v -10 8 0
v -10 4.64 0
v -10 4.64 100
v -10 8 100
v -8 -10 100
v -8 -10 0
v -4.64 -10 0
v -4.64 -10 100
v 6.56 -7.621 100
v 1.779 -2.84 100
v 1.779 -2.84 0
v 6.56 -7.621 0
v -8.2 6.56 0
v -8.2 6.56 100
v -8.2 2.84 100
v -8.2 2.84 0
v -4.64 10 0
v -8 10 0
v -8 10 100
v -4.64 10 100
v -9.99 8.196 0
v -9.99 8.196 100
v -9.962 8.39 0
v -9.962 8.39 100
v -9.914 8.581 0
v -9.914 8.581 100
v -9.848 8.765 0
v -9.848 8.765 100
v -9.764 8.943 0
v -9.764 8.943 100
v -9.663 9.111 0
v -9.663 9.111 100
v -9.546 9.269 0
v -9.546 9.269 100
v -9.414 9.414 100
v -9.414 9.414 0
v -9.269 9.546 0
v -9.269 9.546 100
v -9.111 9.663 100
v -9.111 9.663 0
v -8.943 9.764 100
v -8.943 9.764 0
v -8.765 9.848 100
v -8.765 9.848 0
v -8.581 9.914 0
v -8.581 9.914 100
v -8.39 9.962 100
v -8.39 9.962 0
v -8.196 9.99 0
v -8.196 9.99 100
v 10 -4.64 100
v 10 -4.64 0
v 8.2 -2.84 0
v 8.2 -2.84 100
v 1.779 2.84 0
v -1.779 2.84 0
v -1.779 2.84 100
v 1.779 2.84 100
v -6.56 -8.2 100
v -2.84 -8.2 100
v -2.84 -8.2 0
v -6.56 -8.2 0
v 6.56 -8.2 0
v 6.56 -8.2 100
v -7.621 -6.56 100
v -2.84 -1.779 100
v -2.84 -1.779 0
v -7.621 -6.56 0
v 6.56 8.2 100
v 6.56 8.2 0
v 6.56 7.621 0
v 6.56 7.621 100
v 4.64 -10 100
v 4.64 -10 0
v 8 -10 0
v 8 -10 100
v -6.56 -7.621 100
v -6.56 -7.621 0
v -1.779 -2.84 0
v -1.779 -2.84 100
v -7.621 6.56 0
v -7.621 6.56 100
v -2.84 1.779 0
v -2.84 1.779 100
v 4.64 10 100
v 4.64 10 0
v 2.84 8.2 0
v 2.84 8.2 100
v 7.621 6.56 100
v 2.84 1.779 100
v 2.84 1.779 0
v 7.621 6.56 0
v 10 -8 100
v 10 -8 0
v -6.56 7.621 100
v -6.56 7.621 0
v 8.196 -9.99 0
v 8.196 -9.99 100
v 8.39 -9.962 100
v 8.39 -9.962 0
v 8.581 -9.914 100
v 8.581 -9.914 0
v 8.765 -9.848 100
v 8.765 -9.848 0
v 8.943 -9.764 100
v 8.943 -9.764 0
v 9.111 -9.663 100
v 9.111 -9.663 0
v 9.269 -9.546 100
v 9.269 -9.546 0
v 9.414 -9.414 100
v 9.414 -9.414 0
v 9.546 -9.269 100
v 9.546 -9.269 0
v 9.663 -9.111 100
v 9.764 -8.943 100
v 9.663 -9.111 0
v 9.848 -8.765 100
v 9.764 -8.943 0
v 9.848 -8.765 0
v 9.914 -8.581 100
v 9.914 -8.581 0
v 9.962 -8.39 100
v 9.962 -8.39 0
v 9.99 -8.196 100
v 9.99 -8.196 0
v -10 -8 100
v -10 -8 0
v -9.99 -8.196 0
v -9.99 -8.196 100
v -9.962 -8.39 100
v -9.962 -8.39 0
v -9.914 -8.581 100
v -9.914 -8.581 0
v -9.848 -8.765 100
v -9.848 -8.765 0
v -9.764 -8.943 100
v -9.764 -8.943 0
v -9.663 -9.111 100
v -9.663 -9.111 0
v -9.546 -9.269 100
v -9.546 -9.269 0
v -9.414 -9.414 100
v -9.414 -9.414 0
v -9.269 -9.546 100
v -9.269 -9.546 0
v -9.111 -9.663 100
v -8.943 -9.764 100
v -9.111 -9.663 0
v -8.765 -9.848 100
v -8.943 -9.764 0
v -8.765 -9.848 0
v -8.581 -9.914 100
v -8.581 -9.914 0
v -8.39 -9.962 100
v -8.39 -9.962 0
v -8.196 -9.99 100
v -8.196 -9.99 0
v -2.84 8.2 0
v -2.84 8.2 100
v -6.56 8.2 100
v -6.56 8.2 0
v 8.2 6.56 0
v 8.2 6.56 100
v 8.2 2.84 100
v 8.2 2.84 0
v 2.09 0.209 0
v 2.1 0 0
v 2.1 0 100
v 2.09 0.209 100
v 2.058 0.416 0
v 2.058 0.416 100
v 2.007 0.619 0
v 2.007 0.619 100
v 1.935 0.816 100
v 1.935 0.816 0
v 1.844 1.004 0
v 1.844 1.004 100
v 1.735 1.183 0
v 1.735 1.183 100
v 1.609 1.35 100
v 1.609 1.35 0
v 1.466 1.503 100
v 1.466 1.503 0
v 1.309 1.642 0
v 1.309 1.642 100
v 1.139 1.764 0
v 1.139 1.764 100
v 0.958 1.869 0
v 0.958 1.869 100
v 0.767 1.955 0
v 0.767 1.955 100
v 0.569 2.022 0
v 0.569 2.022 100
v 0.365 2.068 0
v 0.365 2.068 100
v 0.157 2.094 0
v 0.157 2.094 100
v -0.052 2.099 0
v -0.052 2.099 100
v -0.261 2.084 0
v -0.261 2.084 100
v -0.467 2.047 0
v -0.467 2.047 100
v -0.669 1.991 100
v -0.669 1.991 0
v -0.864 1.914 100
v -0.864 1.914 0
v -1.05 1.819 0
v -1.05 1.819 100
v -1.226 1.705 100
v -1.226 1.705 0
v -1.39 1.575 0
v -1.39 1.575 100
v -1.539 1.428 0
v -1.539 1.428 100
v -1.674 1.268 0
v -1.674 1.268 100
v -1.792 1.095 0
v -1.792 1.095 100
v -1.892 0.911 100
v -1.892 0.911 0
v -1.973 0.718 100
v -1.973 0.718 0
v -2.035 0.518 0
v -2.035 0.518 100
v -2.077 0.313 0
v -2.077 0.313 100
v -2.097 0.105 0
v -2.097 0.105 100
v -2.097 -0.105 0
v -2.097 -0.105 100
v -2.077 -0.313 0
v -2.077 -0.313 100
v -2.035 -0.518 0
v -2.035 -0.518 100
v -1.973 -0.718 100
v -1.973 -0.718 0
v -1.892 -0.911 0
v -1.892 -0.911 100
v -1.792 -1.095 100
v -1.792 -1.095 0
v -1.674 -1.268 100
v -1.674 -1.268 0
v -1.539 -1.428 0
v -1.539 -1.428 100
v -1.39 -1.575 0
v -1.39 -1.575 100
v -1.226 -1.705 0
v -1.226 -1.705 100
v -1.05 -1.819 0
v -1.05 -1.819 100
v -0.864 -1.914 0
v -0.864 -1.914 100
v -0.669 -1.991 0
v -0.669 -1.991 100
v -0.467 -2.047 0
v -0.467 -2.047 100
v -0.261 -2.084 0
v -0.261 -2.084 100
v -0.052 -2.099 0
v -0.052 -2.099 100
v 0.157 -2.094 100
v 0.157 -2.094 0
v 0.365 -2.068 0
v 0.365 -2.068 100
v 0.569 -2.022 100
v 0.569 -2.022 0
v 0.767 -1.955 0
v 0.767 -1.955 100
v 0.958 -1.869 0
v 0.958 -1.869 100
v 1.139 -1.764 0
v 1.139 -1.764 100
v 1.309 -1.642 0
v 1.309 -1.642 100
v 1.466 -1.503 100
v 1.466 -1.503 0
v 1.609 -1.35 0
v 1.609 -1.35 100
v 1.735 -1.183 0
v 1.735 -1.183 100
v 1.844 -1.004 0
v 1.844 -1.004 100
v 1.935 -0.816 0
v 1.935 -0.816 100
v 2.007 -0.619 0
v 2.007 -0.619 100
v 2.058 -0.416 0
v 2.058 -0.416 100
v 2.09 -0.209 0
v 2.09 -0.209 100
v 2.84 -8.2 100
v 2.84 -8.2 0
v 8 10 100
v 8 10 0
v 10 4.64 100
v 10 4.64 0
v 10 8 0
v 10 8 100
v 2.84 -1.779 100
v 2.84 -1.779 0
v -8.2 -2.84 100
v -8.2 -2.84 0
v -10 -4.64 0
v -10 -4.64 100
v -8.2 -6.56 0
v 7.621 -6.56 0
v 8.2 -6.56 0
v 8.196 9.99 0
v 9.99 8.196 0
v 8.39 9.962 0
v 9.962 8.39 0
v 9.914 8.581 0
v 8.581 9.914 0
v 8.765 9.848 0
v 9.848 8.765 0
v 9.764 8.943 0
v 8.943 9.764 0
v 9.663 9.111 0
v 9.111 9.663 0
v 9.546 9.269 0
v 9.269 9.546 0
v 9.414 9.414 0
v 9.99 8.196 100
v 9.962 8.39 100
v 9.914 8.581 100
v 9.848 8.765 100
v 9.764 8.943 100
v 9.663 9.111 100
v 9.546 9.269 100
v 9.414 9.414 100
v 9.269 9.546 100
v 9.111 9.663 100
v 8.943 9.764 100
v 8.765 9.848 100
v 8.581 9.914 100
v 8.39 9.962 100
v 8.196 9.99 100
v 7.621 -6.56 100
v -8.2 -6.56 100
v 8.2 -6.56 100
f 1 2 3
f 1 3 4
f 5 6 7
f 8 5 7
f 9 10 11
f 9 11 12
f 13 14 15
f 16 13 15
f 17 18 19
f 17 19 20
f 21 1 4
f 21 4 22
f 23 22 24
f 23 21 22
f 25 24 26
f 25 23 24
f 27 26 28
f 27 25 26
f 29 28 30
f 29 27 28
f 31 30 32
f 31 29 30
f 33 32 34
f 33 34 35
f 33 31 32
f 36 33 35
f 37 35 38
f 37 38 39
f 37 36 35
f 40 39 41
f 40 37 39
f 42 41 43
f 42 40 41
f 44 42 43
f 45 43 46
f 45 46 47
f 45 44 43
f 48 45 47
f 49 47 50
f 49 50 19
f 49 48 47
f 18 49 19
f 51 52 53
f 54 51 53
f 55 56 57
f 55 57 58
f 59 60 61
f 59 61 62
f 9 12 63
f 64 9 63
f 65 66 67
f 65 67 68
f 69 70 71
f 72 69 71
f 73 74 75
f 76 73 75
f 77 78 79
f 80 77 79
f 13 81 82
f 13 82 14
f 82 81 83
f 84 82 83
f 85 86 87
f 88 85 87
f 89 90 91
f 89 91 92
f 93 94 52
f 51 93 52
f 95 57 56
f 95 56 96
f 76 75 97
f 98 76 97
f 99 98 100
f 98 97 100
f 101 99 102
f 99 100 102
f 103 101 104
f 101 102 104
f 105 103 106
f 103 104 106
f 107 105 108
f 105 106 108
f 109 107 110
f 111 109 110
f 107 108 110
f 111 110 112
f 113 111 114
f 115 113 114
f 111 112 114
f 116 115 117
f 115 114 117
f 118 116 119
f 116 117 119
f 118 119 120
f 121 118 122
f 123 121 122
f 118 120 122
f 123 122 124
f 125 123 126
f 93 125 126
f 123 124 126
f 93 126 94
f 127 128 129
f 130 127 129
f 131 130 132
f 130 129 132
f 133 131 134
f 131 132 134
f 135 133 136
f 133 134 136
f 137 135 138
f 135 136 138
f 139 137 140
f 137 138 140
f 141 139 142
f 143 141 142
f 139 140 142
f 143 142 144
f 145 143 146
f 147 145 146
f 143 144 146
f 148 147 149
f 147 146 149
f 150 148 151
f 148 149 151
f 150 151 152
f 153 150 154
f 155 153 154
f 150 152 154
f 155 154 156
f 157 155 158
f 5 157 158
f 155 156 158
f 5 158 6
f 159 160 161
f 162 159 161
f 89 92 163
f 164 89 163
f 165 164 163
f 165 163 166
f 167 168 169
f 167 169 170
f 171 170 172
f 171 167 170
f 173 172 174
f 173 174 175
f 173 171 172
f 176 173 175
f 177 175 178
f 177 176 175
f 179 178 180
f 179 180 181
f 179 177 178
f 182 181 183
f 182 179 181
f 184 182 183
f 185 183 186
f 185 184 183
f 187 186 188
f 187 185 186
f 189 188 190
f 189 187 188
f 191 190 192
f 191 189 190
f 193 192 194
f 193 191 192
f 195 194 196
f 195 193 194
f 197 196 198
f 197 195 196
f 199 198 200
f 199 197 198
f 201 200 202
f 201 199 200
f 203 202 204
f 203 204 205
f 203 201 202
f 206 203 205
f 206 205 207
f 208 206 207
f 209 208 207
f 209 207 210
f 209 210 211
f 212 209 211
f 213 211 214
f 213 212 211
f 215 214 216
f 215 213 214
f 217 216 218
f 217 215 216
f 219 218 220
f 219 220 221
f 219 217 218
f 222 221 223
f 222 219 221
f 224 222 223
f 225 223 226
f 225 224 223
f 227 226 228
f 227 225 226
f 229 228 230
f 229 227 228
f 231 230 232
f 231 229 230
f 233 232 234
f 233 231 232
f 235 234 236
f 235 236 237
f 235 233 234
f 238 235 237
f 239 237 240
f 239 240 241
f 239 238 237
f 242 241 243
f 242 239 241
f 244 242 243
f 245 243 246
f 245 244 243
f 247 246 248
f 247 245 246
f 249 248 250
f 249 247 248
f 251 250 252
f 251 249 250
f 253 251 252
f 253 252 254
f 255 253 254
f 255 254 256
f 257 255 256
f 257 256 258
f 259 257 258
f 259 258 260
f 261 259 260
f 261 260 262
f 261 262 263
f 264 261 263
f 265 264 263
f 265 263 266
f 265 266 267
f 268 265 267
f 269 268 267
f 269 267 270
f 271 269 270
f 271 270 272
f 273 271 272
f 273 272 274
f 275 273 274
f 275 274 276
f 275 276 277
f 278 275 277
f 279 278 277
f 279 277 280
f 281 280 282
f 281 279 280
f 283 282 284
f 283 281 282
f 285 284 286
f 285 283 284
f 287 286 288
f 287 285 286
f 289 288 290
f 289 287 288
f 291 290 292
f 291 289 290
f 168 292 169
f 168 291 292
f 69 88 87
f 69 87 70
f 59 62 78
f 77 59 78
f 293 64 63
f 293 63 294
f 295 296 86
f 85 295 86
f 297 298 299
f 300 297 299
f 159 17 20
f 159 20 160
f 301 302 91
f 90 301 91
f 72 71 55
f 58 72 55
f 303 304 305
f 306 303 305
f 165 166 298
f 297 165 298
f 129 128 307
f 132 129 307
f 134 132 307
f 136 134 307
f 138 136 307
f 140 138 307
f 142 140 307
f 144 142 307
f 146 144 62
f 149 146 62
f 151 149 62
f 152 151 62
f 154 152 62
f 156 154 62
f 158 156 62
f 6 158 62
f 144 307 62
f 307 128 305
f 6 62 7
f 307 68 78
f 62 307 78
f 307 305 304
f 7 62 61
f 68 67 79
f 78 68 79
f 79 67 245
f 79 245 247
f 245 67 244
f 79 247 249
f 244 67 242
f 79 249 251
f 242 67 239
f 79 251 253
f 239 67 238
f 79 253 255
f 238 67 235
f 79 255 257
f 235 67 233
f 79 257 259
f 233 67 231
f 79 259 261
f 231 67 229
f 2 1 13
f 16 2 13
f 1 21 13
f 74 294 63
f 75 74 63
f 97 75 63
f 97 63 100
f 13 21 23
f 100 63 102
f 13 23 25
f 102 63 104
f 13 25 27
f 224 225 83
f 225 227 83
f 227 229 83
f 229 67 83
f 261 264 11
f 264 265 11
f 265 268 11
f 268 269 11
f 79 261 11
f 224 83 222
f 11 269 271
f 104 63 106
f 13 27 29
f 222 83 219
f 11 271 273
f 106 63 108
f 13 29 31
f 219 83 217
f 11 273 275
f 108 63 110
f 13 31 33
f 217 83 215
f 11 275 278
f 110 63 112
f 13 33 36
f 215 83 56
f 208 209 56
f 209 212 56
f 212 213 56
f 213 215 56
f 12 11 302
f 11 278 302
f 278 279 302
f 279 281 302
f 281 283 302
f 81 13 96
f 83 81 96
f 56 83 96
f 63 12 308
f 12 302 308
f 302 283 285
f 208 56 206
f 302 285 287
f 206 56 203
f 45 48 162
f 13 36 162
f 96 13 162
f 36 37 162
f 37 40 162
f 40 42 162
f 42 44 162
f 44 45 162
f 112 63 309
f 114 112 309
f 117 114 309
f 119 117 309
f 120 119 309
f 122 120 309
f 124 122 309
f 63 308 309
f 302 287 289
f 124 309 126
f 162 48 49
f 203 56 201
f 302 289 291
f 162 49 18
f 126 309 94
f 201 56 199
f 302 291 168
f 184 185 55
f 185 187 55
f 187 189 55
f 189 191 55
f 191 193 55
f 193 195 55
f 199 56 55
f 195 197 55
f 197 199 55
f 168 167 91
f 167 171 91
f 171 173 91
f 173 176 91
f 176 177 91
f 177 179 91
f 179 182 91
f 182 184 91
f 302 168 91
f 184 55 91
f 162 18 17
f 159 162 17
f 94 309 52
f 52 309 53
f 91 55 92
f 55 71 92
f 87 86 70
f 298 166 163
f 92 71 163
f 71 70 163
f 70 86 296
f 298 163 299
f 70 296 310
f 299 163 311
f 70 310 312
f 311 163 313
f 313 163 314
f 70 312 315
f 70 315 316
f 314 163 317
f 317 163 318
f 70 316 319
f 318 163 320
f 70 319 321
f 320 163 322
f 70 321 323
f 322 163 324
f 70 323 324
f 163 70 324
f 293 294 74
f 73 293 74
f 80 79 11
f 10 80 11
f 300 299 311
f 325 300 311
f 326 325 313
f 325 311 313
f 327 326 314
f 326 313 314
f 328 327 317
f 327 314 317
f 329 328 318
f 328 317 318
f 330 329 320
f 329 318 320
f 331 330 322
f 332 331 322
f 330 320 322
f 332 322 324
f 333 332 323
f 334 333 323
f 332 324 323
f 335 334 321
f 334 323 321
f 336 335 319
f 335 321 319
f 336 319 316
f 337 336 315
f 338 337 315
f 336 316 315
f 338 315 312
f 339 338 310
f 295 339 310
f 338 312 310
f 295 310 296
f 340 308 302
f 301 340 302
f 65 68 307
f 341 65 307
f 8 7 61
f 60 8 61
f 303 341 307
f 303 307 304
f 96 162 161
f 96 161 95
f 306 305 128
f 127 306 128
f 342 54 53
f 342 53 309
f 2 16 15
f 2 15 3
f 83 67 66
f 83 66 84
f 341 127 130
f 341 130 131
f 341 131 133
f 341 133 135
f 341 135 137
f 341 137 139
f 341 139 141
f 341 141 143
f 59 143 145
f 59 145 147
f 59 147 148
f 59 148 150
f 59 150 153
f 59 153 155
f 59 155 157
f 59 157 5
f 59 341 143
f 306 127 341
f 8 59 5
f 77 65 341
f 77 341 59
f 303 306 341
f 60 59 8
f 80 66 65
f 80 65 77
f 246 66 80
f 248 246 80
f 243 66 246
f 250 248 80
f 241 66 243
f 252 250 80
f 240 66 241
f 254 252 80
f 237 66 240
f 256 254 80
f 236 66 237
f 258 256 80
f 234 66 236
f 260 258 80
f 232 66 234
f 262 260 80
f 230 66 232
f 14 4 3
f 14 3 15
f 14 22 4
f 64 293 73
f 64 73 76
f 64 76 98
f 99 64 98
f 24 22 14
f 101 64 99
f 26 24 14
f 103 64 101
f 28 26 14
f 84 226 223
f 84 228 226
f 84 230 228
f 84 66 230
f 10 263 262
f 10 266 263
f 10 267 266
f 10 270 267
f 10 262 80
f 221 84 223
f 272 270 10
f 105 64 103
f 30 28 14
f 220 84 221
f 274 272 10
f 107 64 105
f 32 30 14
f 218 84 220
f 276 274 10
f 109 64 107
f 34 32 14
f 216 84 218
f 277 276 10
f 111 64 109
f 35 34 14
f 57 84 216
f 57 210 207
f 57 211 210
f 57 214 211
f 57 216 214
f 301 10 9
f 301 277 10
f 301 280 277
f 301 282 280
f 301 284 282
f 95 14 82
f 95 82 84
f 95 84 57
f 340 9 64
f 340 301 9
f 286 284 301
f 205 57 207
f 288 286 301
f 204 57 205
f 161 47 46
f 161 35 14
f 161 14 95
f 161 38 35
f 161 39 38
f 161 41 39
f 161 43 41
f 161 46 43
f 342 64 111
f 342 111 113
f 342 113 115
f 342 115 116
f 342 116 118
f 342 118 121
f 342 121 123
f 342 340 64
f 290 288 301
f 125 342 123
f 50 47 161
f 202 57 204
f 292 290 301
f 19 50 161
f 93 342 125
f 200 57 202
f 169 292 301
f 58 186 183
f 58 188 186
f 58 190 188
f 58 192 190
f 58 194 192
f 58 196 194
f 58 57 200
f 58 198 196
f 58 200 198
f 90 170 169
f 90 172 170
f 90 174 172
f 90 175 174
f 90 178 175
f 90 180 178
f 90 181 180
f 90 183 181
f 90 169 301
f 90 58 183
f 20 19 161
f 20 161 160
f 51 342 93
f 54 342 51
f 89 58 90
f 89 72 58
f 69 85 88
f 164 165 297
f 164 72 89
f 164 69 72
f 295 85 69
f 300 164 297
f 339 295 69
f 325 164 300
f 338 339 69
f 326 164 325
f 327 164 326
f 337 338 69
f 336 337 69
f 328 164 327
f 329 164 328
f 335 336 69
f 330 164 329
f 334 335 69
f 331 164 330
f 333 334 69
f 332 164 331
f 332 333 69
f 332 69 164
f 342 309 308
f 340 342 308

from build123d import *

# Parameters (mm, degrees)
SKETCH1_W           = 5.68
SKETCH1_H           = 5.68
SKETCH1_R           = 2.1
BOSS_EXTRUDE1_DEPTH = 100


with BuildPart() as part:
    # Sketch1 → Boss-Extrude1 (new body)
    with BuildSketch(Plane.XY):
        Rectangle(SKETCH1_W, SKETCH1_H)
        Circle(SKETCH1_R, mode=Mode.SUBTRACT)
        with BuildLine():
            ThreePointArc((-10, 8), (-9.414213562, 9.414213562), (-8, 10))
            Line((-8, 10), (-4.64, 10))
            Line((-4.64, 10), (-2.84, 8.2))
            Line((-2.84, 8.2), (-6.56, 8.2))
            Line((-6.56, 8.2), (-6.56, 6.56))
            Line((-6.56, 6.56), (-8.2, 6.56))
            Line((-8.2, 6.56), (-8.2, 2.84))
            Line((-8.2, 2.84), (-10, 4.64))
            Line((-10, 4.64), (-10, 8))
        make_face()
        with BuildLine():
            Line((10, 4.64), (10, 8))
            ThreePointArc((10, 8), (9.414213562, 9.414213562), (8, 10))
            Line((8, 10), (4.64, 10))
            Line((4.64, 10), (2.84, 8.2))
            Line((2.84, 8.2), (6.56, 8.2))
            Line((6.56, 8.2), (6.56, 6.56))
            Line((6.56, 6.56), (8.2, 6.56))
            Line((8.2, 6.56), (8.2, 2.84))
            Line((8.2, 2.84), (10, 4.64))
        make_face()
        with BuildLine():
            Line((-10, -4.64), (-10, -8))
            ThreePointArc((-10, -8), (-9.414213562, -9.414213562), (-8, -10))
            Line((-8, -10), (-4.64, -10))
            Line((-4.64, -10), (-2.84, -8.2))
            Line((-2.84, -8.2), (-6.56, -8.2))
            Line((-6.56, -8.2), (-6.56, -6.56))
            Line((-6.56, -6.56), (-8.2, -6.56))
            Line((-8.2, -6.56), (-8.2, -2.84))
            Line((-8.2, -2.84), (-10, -4.64))
        make_face()
        with BuildLine():
            Line((4.64, -10), (8, -10))
            ThreePointArc((8, -10), (9.414213562, -9.414213562), (10, -8))
            Line((10, -8), (10, -4.64))
            Line((10, -4.64), (8.2, -2.84))
            Line((8.2, -2.84), (8.2, -6.56))
            Line((8.2, -6.56), (6.56, -6.56))
            Line((6.56, -6.56), (6.56, -8.2))
            Line((6.56, -8.2), (2.84, -8.2))
            Line((2.84, -8.2), (4.64, -10))
        make_face()
        Polygon((7.620660172, -6.56), (2.84, -1.779339828), (2.84, -2.84), (6.56, -6.56), align=None)
        Polygon((6.56, -6.56), (2.84, -2.84), (1.779339828, -2.84), (6.56, -7.620660172), align=None)
        Polygon((-1.779339828, -2.84), (-2.84, -2.84), (-6.56, -6.56), (-6.56, -7.620660172), align=None)
        Polygon((-2.84, -2.84), (-2.84, -1.779339828), (-7.620660172, -6.56), (-6.56, -6.56), align=None)
        Polygon((-2.84, 1.779339828), (-2.84, 2.84), (-6.56, 6.56), (-7.620660172, 6.56), align=None)
        Polygon((-2.84, 2.84), (-1.779339828, 2.84), (-6.56, 7.620660172), (-6.56, 6.56), align=None)
        Polygon((6.56, 6.56), (6.56, 7.620660172), (1.779339828, 2.84), (2.84, 2.84), align=None)
        Polygon((7.620660172, 6.56), (6.56, 6.56), (2.84, 2.84), (2.84, 1.779339828), align=None)
    extrude(amount=BOSS_EXTRUDE1_DEPTH)


solid = part.part
